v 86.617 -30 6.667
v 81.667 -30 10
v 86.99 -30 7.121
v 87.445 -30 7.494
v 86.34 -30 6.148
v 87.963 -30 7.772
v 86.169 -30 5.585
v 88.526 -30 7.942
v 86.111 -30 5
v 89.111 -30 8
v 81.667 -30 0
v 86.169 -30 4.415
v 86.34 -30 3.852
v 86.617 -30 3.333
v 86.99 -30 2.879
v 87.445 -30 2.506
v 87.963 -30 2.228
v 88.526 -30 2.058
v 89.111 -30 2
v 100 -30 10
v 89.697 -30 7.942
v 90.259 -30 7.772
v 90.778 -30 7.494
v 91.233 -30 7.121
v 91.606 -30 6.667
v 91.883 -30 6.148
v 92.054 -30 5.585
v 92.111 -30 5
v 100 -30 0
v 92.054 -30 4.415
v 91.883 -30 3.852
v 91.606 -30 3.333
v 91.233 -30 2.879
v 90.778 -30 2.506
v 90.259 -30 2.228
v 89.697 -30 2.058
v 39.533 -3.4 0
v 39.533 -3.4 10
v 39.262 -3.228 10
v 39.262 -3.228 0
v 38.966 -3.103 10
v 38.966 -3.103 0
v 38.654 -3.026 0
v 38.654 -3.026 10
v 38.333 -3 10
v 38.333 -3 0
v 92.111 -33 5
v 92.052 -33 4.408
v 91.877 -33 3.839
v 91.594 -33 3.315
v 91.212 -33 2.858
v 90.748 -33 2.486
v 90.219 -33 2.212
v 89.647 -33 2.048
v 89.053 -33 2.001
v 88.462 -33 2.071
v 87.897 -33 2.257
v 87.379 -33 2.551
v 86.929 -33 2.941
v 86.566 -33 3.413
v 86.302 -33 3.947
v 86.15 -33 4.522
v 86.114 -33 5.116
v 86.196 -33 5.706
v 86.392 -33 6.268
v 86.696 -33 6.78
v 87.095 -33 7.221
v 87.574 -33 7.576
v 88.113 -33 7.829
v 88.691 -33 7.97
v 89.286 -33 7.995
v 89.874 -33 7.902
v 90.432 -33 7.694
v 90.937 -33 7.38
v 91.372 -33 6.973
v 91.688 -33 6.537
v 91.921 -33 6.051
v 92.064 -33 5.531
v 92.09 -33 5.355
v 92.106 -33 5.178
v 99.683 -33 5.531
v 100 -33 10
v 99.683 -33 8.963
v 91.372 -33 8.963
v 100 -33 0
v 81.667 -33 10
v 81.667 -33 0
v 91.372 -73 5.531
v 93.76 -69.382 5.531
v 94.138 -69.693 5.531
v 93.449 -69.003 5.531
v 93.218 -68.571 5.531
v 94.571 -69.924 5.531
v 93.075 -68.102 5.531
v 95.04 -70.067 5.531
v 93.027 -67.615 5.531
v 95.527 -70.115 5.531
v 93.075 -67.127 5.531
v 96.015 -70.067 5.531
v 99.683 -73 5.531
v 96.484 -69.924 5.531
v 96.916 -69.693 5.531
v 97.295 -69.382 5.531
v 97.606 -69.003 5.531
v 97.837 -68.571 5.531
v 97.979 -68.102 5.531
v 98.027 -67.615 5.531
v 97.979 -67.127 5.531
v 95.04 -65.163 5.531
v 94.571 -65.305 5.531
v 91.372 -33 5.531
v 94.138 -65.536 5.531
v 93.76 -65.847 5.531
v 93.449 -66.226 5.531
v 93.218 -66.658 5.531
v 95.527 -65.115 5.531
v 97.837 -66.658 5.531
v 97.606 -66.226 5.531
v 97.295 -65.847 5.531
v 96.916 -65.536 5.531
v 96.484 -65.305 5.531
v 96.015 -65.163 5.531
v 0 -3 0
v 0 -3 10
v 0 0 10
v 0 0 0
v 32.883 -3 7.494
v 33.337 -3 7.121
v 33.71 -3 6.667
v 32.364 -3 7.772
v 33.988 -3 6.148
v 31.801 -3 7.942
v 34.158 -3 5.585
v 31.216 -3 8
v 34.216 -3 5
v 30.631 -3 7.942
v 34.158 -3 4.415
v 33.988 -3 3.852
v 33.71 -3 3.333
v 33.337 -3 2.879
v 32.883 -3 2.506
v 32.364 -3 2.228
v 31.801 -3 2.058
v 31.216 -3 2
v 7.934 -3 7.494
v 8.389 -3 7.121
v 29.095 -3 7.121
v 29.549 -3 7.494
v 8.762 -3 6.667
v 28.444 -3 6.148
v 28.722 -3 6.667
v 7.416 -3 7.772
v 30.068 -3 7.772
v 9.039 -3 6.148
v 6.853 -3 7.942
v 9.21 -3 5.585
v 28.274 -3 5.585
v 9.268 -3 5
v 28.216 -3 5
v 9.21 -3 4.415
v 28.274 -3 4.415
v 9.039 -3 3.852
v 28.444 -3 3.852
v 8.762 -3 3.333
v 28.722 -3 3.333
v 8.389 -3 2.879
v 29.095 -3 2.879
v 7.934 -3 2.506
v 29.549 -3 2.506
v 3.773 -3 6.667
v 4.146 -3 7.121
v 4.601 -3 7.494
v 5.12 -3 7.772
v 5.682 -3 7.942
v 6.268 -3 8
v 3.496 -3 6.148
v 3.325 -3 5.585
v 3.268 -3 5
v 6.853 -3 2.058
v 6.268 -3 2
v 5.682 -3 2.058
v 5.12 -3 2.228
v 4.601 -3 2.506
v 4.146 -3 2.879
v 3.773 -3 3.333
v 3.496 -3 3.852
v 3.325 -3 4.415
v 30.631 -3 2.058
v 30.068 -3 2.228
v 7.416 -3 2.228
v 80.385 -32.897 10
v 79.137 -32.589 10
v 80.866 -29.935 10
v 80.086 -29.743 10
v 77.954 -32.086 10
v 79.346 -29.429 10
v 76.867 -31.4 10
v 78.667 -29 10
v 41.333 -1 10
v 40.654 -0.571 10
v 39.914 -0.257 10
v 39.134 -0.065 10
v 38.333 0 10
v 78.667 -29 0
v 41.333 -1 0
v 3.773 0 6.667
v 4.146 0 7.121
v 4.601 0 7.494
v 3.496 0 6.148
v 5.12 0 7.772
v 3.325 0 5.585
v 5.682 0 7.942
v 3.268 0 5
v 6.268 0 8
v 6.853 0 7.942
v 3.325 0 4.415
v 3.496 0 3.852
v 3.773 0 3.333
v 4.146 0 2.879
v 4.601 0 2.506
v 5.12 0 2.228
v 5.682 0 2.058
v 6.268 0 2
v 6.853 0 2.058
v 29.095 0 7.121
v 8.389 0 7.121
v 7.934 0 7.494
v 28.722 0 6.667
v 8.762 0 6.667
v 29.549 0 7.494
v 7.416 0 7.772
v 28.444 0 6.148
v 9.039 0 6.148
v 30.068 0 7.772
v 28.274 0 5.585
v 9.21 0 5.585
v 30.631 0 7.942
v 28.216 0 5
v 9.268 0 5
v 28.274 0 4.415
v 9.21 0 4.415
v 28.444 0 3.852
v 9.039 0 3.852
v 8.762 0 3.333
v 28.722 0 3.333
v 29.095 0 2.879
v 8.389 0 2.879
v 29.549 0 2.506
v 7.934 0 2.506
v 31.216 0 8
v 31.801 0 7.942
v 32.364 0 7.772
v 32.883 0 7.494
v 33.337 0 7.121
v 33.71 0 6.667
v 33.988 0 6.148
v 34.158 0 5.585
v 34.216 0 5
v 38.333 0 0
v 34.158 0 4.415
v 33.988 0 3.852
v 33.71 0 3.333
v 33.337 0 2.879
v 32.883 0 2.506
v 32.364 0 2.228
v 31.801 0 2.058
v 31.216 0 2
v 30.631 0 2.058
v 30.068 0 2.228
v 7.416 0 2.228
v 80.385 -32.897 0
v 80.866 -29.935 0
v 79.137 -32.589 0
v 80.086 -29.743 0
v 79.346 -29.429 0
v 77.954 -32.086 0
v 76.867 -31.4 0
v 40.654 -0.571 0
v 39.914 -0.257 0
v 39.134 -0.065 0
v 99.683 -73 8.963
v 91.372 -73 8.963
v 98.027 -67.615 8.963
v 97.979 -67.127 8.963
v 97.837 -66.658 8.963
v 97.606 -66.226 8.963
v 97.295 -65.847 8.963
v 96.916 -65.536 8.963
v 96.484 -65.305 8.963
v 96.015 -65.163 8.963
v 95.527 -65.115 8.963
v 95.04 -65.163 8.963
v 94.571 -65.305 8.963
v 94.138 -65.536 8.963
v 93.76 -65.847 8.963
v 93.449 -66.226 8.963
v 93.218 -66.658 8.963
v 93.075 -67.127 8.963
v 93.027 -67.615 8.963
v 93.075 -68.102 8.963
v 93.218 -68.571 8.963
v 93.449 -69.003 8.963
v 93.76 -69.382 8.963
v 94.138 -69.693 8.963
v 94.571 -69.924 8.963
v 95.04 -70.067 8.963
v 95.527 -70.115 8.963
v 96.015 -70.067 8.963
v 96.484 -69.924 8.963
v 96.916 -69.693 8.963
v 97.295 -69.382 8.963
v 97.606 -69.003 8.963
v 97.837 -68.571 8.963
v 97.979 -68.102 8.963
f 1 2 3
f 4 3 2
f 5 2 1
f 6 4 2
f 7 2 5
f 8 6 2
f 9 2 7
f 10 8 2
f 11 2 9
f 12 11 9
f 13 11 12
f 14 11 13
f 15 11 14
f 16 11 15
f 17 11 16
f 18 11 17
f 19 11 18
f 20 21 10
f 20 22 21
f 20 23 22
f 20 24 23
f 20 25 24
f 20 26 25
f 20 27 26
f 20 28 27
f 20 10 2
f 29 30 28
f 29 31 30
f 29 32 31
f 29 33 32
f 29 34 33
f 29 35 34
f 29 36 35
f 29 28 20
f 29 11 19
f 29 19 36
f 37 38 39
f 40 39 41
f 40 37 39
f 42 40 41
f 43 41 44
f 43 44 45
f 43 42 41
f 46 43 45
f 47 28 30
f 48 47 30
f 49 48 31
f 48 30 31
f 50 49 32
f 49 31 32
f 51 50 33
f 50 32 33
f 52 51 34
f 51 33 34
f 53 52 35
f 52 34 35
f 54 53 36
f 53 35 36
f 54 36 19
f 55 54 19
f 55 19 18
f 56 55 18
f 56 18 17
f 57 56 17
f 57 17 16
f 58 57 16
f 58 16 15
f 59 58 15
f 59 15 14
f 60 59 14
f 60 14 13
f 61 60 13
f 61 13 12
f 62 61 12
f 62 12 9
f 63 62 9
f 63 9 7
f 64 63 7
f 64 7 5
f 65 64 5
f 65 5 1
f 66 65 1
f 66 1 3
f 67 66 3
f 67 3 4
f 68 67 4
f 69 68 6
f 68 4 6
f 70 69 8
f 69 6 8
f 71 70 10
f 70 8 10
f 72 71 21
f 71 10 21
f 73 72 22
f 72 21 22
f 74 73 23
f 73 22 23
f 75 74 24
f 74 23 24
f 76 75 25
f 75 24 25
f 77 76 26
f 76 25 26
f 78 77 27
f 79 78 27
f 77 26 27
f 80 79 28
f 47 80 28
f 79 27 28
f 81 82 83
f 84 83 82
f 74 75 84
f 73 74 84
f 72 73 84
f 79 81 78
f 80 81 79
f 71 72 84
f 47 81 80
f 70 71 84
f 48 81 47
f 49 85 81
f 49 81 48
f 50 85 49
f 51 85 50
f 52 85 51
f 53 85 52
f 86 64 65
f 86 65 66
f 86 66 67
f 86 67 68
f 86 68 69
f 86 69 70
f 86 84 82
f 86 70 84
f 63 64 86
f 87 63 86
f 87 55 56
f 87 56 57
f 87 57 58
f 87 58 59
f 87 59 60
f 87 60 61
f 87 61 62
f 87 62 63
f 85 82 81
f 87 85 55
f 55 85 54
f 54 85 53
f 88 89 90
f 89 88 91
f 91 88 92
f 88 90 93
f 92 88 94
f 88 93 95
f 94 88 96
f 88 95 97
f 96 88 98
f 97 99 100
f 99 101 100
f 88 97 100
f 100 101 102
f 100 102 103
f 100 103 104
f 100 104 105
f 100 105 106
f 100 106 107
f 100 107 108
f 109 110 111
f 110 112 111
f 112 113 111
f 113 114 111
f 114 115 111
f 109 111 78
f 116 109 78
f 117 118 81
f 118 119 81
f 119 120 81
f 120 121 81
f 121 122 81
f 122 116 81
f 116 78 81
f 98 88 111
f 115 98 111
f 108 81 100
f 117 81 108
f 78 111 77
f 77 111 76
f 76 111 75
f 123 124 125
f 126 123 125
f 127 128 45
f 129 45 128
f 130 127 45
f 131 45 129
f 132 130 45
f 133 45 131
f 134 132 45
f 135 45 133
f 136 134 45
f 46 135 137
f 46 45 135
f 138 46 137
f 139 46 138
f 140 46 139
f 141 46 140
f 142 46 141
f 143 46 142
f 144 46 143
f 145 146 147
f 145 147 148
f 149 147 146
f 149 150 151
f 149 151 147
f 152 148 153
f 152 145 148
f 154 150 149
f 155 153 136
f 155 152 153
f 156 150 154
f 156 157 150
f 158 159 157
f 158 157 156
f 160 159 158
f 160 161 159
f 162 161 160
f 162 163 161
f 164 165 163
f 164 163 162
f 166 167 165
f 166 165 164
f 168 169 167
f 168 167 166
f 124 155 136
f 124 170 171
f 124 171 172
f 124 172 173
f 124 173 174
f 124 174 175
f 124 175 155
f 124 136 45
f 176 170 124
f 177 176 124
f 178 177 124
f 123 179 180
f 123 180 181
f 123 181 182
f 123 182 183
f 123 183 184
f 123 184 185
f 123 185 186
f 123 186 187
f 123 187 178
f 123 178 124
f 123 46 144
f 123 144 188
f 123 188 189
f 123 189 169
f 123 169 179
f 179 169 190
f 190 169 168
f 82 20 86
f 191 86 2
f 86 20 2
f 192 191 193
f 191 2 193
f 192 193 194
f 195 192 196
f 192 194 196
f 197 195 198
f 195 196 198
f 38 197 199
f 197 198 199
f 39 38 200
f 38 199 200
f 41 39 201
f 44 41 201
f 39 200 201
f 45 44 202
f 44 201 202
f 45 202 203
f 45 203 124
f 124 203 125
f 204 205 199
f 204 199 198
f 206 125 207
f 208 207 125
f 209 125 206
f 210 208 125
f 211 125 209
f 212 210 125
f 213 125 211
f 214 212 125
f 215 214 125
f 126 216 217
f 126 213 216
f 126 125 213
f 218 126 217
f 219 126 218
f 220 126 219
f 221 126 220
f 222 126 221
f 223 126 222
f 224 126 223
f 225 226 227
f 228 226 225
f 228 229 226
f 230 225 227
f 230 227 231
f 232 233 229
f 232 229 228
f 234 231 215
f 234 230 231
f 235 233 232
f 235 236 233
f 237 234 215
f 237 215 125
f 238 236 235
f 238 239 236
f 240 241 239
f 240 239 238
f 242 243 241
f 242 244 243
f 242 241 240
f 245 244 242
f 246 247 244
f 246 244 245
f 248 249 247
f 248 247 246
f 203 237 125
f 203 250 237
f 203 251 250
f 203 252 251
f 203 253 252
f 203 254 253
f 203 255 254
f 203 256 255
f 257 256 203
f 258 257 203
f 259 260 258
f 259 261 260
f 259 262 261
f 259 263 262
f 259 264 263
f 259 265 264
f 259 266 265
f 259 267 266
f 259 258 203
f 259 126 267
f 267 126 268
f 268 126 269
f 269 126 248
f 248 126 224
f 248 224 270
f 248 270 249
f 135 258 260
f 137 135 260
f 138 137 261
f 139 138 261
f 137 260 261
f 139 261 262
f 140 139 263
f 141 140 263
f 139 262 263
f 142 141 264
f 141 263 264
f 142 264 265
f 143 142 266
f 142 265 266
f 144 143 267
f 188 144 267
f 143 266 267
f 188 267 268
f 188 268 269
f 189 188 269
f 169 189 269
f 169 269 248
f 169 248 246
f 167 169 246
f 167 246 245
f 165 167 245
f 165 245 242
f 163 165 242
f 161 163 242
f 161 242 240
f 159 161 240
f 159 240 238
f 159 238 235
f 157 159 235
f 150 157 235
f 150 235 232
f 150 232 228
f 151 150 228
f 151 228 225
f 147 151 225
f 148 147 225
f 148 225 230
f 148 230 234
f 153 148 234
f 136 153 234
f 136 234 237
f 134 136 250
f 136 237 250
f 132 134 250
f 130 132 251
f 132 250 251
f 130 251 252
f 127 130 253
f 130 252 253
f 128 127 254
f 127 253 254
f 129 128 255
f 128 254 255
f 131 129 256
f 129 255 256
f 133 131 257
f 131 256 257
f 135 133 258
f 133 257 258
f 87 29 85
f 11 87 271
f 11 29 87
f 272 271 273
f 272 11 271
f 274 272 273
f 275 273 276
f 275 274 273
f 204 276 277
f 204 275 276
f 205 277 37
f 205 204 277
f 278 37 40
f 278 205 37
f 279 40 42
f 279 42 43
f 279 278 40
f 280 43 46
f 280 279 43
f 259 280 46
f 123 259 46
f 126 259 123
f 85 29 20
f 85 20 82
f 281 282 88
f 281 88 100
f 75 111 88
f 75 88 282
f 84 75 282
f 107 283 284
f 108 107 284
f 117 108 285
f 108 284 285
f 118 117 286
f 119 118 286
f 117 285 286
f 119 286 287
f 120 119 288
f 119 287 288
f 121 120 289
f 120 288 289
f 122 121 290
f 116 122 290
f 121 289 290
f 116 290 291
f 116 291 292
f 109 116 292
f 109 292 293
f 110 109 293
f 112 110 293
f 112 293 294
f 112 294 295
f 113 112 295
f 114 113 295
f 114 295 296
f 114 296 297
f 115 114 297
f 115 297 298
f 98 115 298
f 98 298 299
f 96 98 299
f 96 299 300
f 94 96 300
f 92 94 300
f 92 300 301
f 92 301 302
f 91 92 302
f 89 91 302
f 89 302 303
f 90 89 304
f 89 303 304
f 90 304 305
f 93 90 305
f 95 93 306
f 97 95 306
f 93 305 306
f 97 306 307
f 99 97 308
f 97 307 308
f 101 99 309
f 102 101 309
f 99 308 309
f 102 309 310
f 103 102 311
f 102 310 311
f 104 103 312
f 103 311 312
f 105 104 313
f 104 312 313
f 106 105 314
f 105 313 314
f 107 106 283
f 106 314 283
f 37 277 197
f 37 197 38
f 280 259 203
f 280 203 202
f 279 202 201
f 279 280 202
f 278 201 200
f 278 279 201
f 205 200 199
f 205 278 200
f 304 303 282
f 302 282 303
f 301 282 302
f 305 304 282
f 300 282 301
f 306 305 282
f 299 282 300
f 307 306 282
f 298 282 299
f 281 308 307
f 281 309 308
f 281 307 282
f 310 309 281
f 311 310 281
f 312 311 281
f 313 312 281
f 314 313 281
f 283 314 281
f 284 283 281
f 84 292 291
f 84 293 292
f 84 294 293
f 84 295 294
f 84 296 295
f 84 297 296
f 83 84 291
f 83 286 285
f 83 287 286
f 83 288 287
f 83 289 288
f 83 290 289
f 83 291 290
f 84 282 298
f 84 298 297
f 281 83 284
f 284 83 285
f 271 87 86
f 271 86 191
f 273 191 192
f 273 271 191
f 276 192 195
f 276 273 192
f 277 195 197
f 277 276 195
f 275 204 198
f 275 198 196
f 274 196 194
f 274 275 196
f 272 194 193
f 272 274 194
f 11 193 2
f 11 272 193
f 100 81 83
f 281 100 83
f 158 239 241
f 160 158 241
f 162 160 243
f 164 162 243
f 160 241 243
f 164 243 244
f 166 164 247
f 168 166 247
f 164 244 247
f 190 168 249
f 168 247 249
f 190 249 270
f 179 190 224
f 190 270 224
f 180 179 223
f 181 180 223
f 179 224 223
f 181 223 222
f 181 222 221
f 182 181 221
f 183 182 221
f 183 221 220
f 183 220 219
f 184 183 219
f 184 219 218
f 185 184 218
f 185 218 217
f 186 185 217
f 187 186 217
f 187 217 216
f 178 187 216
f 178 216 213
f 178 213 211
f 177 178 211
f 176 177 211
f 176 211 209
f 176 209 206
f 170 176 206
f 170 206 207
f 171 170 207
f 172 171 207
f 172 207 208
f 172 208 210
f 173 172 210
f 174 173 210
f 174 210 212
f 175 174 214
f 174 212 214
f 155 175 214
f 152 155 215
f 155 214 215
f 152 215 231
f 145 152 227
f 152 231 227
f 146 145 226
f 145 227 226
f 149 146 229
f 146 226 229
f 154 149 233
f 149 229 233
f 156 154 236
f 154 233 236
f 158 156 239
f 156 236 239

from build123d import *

# Parameters (mm, degrees)
BOSS_EXTRUDE1_DEPTH = 10
SKETCH2_R           = 3
CUT_EXTRUDE1_DEPTH  = 34
SKETCH3_W           = 8.31174776
SKETCH3_H           = 3.43251071
BOSS_EXTRUDE2_DEPTH = 40
SKETCH4_R           = 2.5
CUT_EXTRUDE2_DEPTH  = 9.963348995


with BuildPart() as part:
    # Sketch1 → Boss-Extrude1 (new body)
    with BuildSketch(Plane.XY):
        with BuildLine():
            Line((0, 0), (38.333333333, 0))
            ThreePointArc((38.333333333, 0), (39.914472163, -0.25658351), (41.333333333, -1))
            Line((41.333333333, -1), (78.666666667, -29))
            ThreePointArc((78.666666667, -29), (80.085527837, -29.74341649), (81.666666667, -30))
            Line((81.666666667, -30), (100, -30))
            Line((100, -30), (100, -33))
            Line((100, -33), (81.666666667, -33))
            ThreePointArc((81.666666667, -33), (79.136844539, -32.589466384), (76.866666667, -31.4))
            Line((76.866666667, -31.4), (39.533333333, -3.4))
            ThreePointArc((39.533333333, -3.4), (38.965788865, -3.102633404), (38.333333333, -3))
            Line((38.333333333, -3), (0, -3))
            Line((0, -3), (0, 0))
        make_face()
    extrude(amount=BOSS_EXTRUDE1_DEPTH)

    # Sketch2 → Cut-Extrude1 (cut, through all)
    with BuildSketch(Plane(origin=(0, 0, 0), x_dir=(1, 0, 0), z_dir=(0, 1, 0))):
        with Locations((6.267592097, -5)):
            Circle(SKETCH2_R)
        with Locations((31.216017877, -5)):
            Circle(SKETCH2_R)
        with Locations((89.111430709, -5)):
            Circle(SKETCH2_R)
    extrude(amount=-CUT_EXTRUDE1_DEPTH, mode=Mode.SUBTRACT)

    # Sketch3 → Boss-Extrude2 (add)
    with BuildSketch(Plane.XZ.offset(33)):
        with Locations((95.527410175, 7.24709364)):
            Rectangle(SKETCH3_W, SKETCH3_H)
    extrude(amount=BOSS_EXTRUDE2_DEPTH)

    # Sketch4 → Cut-Extrude2 (cut, through all)
    with BuildSketch(Plane.XY.offset(8.963348995)):
        with Locations((95.527410175, -67.614542538)):
            Circle(SKETCH4_R)
    extrude(amount=-CUT_EXTRUDE2_DEPTH, mode=Mode.SUBTRACT)


solid = part.part
